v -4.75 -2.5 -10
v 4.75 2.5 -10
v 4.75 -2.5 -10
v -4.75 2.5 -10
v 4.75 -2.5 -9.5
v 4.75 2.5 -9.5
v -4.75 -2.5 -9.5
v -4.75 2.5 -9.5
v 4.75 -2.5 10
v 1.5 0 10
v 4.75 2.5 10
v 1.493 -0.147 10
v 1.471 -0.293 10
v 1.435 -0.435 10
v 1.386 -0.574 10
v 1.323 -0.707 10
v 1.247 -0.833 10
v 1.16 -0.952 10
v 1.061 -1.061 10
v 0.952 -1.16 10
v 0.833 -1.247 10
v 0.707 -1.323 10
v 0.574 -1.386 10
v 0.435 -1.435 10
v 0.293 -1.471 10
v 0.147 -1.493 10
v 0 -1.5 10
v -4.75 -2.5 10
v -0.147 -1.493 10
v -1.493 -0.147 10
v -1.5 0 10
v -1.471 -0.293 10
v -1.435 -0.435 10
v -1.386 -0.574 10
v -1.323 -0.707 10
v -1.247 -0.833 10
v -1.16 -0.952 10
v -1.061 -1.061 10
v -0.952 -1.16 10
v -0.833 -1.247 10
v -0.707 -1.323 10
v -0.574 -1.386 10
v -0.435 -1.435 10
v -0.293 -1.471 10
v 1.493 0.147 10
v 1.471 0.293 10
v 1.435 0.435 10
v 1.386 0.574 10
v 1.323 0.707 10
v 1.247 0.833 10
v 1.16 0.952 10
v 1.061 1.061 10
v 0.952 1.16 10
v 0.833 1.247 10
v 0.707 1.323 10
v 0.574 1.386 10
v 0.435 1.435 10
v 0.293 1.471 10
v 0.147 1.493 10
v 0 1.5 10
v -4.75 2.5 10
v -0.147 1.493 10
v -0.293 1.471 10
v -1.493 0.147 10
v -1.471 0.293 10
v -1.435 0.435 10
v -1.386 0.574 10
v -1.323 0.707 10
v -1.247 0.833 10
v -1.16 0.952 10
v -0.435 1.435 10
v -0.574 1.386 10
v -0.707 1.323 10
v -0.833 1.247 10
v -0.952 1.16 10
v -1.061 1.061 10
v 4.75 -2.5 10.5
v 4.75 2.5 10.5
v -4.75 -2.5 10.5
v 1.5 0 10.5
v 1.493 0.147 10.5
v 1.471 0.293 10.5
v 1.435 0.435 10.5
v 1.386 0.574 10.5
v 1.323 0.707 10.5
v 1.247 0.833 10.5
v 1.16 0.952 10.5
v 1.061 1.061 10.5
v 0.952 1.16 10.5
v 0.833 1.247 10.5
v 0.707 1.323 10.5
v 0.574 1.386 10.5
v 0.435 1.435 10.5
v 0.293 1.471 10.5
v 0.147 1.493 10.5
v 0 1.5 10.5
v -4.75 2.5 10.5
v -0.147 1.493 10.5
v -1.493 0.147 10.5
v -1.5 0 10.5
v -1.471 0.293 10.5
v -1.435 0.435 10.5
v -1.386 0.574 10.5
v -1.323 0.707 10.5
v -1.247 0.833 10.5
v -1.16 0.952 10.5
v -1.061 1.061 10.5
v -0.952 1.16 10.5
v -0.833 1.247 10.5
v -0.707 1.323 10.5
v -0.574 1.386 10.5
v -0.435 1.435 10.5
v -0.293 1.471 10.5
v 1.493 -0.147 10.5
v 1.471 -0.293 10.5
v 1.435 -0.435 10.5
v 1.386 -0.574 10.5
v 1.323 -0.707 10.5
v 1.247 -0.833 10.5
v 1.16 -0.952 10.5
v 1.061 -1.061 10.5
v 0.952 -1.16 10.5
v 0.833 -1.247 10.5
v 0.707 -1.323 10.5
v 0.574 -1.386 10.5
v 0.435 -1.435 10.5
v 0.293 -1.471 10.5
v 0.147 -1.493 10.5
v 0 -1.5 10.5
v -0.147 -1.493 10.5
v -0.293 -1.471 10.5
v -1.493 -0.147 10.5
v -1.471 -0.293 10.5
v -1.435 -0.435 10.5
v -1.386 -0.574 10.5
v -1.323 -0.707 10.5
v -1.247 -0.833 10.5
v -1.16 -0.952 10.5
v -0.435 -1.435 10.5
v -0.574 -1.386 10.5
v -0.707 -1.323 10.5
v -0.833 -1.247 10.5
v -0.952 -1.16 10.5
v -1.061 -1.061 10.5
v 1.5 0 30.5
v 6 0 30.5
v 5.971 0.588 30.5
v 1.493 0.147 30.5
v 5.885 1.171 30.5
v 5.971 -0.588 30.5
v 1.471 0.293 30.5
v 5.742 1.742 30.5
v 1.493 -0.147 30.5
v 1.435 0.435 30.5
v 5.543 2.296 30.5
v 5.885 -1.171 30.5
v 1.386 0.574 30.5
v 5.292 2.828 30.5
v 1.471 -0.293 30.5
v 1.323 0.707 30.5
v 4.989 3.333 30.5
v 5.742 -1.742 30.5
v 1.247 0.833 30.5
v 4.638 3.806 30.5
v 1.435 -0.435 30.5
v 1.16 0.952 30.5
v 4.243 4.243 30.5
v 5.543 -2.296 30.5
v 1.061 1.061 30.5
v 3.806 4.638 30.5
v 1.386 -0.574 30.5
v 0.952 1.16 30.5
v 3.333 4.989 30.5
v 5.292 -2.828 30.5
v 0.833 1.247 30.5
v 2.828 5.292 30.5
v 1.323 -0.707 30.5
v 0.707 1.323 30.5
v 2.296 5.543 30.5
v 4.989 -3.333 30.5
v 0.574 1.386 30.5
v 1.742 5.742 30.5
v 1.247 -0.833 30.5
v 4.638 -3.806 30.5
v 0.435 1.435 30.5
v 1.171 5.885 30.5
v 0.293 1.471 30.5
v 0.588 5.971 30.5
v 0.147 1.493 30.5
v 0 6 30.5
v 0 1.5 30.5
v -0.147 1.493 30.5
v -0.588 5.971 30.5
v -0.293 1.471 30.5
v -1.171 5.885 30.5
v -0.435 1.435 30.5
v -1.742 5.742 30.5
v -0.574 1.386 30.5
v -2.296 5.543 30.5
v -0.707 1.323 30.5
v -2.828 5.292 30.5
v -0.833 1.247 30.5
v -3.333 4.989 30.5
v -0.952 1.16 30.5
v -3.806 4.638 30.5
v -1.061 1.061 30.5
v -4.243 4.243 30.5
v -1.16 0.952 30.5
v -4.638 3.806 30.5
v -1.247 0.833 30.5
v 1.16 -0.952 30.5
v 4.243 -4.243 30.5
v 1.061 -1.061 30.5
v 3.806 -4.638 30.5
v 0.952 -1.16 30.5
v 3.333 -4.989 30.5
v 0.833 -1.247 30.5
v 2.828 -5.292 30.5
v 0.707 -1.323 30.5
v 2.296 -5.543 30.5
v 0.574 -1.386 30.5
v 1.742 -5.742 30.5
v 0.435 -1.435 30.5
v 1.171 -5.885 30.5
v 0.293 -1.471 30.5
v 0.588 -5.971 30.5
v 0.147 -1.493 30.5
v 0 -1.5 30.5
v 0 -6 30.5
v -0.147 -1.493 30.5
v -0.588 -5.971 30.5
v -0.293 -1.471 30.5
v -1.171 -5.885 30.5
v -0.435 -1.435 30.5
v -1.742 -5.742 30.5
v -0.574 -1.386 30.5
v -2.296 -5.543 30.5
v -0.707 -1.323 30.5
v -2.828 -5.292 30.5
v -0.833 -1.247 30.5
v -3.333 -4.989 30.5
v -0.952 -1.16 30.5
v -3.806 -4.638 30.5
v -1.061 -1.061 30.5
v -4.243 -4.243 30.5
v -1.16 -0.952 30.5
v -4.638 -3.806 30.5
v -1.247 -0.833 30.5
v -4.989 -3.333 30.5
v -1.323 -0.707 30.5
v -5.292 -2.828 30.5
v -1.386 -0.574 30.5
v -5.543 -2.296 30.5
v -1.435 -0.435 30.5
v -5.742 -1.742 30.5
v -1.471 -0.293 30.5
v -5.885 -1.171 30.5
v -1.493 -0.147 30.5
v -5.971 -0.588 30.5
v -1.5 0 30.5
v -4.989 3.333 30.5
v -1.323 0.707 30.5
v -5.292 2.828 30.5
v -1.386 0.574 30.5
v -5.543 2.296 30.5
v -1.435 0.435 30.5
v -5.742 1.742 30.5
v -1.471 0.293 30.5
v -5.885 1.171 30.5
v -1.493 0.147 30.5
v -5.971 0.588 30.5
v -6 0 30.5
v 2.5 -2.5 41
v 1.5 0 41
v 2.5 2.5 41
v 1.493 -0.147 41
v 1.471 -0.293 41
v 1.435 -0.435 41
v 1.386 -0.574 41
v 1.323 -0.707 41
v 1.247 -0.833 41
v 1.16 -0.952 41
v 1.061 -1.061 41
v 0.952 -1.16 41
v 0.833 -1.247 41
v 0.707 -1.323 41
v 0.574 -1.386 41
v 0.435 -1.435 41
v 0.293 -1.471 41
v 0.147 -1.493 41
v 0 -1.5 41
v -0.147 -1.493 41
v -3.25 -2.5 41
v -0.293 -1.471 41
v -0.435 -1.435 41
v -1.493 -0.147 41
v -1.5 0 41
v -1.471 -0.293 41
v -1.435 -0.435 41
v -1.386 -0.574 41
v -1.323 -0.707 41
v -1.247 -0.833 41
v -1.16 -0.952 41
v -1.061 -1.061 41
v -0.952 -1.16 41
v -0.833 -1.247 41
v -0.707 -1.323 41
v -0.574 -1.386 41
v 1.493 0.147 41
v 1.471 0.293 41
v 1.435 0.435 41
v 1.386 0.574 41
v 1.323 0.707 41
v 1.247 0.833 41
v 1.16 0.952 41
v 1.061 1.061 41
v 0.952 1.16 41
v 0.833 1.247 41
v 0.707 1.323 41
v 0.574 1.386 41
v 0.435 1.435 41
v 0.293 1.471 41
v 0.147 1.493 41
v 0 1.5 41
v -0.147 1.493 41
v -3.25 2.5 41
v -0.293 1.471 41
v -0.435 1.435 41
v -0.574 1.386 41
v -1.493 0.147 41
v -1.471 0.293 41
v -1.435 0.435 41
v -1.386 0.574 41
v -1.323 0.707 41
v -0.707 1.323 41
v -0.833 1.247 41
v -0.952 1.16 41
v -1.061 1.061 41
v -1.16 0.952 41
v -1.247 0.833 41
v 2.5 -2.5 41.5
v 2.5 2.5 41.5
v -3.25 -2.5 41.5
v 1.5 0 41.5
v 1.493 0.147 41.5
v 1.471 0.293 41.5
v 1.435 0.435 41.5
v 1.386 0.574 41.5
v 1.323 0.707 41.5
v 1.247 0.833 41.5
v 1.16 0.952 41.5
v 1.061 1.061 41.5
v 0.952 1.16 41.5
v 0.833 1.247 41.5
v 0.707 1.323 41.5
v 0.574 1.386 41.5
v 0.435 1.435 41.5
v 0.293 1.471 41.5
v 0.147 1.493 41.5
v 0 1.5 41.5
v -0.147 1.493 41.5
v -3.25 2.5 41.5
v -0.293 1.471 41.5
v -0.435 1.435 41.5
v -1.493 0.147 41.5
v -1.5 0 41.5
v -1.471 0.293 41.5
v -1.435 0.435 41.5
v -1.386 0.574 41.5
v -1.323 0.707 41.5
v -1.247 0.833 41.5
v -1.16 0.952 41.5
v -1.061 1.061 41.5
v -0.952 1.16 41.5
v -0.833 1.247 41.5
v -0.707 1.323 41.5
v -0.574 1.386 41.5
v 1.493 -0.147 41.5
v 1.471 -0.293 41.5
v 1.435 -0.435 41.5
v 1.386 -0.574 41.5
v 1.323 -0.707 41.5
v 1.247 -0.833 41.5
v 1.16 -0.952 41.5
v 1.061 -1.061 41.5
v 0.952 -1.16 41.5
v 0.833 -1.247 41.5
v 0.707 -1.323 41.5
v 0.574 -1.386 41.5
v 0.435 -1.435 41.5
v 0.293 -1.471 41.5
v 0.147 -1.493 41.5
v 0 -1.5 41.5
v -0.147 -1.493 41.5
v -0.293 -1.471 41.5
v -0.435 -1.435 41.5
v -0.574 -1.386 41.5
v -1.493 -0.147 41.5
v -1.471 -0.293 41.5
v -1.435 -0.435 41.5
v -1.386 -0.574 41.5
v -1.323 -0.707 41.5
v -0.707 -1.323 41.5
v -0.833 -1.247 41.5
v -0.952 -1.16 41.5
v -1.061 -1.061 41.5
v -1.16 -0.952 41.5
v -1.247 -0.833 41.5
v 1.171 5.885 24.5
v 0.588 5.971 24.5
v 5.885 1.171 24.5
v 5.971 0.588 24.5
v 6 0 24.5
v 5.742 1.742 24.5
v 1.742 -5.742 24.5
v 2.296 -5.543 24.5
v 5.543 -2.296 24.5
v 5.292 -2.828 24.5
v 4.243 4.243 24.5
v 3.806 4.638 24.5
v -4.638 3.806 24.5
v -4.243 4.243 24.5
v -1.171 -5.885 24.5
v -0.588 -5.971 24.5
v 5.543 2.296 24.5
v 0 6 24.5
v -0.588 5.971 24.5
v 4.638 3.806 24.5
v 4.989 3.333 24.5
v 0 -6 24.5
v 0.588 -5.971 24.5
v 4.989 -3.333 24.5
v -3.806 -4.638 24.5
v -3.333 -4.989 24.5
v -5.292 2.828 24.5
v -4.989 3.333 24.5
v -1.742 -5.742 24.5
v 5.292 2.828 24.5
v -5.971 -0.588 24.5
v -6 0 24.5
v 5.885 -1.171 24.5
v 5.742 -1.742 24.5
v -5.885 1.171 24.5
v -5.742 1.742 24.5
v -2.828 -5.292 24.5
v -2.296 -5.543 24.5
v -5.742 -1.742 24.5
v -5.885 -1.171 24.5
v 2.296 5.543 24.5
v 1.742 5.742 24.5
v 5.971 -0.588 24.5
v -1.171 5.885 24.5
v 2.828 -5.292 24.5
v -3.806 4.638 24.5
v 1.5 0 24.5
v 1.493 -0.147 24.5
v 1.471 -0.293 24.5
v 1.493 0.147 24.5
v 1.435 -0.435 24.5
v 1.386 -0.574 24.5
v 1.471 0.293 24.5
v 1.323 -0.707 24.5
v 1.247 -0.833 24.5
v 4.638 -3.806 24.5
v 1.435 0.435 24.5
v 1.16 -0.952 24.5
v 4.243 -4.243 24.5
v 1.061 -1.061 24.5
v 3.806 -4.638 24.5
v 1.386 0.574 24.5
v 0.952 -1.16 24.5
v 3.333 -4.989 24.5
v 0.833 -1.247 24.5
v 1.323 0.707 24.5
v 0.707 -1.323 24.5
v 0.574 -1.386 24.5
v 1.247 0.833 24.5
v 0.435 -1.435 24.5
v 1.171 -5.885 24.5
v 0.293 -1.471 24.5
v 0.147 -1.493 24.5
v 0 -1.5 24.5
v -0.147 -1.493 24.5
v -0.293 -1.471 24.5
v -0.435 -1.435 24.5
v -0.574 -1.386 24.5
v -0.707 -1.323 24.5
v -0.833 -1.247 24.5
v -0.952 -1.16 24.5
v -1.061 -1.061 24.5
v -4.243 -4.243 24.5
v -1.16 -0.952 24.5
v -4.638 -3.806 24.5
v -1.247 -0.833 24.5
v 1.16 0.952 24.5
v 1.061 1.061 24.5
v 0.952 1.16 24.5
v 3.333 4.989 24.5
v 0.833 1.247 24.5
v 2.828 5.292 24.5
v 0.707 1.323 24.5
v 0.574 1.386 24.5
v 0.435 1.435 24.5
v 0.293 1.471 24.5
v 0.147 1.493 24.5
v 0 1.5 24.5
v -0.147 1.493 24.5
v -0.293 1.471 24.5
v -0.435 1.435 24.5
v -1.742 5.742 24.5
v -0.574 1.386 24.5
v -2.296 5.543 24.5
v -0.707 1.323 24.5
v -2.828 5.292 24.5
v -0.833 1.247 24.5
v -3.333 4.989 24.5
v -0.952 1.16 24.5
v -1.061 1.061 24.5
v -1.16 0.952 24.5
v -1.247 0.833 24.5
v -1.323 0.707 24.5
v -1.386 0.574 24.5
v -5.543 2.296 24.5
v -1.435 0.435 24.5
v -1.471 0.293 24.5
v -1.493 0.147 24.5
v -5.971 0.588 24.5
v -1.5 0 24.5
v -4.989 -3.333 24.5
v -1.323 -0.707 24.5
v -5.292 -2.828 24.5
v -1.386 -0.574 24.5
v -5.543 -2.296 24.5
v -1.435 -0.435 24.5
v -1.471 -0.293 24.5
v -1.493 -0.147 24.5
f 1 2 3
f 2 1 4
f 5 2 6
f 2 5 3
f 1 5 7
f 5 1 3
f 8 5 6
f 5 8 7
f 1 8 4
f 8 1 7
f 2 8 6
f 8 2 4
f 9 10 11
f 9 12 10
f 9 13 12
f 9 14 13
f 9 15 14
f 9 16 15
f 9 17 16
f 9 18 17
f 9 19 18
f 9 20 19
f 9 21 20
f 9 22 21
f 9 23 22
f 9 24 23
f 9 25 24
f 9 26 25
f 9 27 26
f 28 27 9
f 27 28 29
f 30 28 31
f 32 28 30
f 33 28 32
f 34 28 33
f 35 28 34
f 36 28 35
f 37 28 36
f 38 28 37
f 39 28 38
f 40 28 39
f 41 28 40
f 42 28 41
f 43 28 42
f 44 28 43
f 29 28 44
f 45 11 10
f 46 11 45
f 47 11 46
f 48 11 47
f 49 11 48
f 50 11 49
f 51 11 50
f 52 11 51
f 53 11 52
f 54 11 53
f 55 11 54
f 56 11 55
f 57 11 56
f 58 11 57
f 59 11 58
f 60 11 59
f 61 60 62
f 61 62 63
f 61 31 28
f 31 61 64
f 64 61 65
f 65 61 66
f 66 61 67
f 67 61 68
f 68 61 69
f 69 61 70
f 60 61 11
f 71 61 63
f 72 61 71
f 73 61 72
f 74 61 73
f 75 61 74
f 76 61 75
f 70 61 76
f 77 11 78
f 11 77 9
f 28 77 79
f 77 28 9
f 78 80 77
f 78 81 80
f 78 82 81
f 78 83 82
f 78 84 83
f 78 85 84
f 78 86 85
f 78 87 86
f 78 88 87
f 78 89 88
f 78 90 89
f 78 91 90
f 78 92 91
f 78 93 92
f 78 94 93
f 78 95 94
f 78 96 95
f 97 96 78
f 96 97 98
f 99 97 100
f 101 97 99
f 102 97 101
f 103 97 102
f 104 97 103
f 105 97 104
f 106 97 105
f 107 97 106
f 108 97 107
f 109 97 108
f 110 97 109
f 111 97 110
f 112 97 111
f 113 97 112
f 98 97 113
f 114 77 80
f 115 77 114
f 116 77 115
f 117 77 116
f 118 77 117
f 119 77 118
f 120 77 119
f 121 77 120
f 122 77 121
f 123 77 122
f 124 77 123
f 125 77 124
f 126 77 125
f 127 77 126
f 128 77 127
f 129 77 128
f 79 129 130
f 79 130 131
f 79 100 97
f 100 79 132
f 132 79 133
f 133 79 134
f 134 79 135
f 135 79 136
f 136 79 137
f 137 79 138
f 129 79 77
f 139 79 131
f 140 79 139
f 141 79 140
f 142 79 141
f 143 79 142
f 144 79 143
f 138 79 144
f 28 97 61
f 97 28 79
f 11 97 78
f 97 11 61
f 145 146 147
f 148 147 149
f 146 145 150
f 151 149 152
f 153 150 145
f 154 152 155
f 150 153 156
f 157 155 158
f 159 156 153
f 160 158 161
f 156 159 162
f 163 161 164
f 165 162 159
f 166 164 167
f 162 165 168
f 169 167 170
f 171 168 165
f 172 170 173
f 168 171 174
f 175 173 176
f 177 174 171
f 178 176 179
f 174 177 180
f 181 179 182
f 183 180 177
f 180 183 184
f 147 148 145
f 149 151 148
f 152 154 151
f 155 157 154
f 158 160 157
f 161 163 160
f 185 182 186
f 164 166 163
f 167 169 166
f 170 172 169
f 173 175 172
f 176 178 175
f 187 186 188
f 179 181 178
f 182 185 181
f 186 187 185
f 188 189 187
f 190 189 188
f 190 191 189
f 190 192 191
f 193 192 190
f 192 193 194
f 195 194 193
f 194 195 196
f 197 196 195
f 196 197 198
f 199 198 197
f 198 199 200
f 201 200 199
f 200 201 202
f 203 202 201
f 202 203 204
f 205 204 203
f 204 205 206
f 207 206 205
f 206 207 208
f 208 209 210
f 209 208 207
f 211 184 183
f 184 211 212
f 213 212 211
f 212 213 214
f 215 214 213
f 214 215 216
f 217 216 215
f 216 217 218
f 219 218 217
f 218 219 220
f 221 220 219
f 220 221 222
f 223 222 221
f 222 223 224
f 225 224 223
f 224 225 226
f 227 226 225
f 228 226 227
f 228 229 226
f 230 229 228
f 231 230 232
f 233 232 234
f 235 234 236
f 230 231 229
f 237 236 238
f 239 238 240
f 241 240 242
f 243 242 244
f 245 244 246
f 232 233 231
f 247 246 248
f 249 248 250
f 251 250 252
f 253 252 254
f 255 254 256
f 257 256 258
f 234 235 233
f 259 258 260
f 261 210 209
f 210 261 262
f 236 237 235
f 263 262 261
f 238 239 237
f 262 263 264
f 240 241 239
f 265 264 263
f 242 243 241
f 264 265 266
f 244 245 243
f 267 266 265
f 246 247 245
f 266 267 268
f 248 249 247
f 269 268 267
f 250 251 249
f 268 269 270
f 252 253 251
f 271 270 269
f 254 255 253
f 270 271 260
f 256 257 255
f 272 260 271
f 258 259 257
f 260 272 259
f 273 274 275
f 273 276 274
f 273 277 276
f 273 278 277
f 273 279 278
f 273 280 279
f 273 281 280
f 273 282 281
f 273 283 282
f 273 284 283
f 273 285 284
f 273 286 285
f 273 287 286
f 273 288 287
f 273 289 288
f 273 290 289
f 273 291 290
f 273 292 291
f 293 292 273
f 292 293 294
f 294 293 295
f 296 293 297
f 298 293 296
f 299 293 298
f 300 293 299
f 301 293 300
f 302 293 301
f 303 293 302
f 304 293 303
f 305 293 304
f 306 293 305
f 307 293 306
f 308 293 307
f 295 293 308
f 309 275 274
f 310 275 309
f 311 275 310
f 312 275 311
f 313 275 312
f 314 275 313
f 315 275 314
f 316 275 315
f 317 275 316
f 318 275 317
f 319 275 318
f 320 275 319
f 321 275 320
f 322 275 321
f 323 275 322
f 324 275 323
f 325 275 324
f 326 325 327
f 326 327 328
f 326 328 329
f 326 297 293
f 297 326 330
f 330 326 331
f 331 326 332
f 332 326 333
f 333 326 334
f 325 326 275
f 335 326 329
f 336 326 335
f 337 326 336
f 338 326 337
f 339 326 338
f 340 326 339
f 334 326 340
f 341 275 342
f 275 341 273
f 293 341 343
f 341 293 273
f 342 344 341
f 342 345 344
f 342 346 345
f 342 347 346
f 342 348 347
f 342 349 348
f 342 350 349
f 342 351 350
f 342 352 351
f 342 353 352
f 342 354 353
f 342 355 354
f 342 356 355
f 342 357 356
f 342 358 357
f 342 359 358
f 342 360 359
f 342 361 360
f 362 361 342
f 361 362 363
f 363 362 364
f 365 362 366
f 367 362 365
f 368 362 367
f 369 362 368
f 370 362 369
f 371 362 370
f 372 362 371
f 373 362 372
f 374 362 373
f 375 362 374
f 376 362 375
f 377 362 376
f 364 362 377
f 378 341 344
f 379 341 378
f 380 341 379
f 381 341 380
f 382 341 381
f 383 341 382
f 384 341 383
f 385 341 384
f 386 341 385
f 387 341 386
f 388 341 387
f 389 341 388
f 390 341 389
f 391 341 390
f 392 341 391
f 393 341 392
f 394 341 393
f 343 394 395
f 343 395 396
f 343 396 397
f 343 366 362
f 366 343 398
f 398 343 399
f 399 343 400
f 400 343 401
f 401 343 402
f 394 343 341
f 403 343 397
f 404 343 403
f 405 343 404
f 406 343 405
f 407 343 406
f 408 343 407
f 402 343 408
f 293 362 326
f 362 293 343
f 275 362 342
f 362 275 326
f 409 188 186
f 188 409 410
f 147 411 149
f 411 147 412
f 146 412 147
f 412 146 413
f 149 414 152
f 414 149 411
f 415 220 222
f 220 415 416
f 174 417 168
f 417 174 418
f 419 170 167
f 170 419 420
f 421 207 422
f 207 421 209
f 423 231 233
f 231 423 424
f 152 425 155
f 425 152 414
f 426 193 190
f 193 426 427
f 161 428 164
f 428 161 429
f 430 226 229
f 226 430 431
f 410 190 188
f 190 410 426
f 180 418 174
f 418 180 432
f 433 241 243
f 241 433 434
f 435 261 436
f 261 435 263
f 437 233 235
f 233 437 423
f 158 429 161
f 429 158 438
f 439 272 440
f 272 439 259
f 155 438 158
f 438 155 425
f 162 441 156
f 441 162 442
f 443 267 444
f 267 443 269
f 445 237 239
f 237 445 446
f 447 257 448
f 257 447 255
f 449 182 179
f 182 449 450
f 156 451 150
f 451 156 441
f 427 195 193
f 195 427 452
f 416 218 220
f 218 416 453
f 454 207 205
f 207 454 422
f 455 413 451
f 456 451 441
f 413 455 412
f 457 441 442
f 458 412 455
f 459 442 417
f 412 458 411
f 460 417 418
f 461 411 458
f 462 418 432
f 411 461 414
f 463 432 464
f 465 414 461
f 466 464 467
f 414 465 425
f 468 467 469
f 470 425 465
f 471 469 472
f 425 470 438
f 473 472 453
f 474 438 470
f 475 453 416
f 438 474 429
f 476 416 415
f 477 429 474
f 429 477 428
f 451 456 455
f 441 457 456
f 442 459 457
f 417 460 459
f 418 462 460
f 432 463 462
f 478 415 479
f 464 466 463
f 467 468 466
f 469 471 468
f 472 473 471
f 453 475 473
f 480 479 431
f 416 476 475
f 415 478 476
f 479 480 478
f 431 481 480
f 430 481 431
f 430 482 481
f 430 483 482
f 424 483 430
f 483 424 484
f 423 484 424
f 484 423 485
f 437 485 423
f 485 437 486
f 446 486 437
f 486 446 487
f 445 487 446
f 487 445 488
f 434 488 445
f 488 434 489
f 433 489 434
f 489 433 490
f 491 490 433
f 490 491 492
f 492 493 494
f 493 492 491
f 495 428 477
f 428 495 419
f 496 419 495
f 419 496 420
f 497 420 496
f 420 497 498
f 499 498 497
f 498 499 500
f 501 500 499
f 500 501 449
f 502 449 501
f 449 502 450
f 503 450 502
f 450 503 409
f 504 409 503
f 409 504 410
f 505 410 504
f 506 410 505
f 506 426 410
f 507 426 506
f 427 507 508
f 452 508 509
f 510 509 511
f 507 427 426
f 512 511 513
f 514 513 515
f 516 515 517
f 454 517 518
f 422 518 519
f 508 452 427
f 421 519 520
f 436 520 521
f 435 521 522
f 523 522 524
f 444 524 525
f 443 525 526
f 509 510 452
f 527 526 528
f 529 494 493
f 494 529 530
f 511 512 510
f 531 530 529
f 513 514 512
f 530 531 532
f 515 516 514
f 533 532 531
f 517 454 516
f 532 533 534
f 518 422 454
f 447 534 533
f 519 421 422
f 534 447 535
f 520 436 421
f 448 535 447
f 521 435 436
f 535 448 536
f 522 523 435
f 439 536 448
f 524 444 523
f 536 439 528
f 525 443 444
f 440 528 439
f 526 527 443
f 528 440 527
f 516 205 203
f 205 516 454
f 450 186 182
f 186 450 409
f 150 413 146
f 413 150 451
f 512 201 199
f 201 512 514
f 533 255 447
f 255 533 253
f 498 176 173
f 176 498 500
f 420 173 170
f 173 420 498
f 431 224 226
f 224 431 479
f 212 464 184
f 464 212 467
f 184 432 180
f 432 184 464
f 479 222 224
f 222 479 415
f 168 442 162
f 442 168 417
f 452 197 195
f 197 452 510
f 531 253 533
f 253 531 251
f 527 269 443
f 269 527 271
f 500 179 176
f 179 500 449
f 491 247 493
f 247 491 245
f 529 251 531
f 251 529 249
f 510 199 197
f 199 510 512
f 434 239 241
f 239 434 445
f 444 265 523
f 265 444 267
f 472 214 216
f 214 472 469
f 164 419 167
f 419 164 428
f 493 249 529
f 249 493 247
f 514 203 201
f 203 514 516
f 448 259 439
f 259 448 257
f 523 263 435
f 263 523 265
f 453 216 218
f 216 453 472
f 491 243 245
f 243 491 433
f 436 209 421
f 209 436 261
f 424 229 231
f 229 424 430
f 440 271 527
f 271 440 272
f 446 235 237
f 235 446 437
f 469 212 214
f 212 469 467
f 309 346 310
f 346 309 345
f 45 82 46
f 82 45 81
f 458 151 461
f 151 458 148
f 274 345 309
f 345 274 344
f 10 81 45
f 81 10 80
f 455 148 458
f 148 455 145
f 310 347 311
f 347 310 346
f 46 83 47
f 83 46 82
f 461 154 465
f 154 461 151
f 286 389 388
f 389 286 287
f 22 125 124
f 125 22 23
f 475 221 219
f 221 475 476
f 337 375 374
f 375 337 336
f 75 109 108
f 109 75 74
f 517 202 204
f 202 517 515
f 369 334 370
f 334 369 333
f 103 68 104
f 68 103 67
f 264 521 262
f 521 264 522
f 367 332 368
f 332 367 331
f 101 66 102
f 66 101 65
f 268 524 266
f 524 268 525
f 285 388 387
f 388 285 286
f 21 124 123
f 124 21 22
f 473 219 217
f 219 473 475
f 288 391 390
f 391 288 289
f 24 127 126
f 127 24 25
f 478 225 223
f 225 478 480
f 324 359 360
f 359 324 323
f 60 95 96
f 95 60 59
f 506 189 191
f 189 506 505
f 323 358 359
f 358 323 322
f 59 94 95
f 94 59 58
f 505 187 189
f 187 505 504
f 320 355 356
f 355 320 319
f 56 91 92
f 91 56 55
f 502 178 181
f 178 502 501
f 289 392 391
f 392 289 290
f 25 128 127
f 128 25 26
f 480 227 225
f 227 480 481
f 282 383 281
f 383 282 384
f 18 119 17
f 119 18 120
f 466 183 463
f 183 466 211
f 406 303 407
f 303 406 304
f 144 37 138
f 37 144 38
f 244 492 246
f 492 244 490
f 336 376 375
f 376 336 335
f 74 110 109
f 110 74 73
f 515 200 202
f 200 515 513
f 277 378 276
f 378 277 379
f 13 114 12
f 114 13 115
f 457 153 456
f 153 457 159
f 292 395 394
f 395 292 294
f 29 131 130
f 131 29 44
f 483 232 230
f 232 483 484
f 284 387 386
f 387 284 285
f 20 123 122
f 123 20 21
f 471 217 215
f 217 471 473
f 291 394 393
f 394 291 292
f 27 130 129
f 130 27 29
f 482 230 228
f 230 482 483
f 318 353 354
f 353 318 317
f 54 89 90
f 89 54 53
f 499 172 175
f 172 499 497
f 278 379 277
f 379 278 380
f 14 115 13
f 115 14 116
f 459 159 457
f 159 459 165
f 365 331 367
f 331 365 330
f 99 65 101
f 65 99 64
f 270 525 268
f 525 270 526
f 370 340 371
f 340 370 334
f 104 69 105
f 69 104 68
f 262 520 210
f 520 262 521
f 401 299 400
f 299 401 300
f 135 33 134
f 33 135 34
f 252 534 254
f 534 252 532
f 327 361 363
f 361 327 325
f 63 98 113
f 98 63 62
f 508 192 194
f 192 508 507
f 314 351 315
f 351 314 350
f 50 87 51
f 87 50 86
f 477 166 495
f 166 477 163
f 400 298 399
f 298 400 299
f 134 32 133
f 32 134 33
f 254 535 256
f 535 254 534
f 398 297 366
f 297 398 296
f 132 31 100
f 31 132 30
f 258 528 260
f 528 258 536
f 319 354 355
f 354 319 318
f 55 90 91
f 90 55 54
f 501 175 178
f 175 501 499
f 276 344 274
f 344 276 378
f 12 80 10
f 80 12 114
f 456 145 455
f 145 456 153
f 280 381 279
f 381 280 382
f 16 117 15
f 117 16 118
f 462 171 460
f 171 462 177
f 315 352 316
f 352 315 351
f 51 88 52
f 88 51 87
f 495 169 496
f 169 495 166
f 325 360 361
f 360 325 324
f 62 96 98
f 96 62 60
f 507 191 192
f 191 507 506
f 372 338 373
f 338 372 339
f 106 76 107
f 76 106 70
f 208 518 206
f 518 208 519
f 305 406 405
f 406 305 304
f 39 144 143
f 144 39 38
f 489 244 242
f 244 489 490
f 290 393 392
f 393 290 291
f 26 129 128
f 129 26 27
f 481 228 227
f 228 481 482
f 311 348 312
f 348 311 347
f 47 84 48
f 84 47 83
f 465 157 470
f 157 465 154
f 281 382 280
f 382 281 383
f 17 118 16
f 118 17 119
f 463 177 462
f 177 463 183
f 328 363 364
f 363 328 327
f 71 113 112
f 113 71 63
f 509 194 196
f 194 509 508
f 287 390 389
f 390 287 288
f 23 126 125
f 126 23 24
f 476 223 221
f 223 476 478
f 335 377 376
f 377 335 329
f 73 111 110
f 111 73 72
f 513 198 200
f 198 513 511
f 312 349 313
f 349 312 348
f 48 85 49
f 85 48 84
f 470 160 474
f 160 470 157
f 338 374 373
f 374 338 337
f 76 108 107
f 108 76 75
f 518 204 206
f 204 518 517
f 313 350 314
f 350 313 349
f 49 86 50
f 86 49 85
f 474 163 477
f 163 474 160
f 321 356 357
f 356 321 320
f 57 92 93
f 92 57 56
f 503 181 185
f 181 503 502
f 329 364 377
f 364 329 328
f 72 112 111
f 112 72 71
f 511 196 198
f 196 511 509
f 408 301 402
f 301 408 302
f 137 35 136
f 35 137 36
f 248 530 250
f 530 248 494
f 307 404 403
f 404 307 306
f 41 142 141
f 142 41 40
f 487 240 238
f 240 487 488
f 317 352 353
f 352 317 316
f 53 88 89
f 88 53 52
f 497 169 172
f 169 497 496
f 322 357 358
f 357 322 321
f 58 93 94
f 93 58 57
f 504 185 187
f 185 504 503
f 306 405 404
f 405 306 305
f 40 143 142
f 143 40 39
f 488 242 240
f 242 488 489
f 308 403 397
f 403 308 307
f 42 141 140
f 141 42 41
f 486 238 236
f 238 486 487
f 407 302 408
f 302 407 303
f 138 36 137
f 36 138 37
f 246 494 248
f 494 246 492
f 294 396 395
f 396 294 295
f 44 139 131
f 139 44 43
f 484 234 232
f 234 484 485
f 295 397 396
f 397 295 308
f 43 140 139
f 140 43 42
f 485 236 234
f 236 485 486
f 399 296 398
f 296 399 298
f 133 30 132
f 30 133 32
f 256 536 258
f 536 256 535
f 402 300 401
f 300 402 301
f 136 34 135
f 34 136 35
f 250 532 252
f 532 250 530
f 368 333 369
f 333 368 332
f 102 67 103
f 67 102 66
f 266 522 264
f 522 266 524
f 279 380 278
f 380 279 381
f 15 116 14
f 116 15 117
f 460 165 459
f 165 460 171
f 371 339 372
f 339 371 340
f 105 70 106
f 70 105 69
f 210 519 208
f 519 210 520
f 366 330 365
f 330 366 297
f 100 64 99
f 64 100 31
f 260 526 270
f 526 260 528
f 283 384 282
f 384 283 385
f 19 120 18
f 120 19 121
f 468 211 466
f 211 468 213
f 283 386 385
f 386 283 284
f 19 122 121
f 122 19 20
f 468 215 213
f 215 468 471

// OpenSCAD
// Straight hose-barb reducer: 8 mm tubing (barbs) -> 5 mm tubing (barbs)
// Print orientation: standing upright along Z, centred on origin in X/Y

$fn = 64;

// ---- Dimensions (mm) ----
small_id      = 8;    // inner diameter of the larger (8 mm) tubing
large_id      = 5;    // inner diameter of the smaller (5 mm) tubing
bore          = 3;    // through-bore diameter
barb_h_8      = 10;   // height of each 8 mm barb
collar_h      = 5;    // height of the 12 mm collar (z = 20 to 25)
barb_h_5      = 8;    // height of each 5 mm barb
eps           = 0.5;  // overshoot for clean boolean cuts

// ---- Derived ----
x = bore / 2 + 1;  // radial offset of the through-bore from the axis
z0 = 0;
z1 = z0 + 2 * barb_h_8;   // top of the 8 mm barbs (20)
z2 = z1 + collar_h;       // top of the collar (25)
z3 = z2 + 2 * barb_h_5;   // top of the 5 mm barbs (41)

// ---- Model ----
difference() {
    union() {
        // 8 mm tubing barbs: sawtooth profile, stacked
        for (s = [-1, 1])
            translate([0, 0, z0 + s * barb_h_8])
                linear_extrude(height = eps)
                    polygon([
                        [-9.5 / 2, -x], [-9.5 / 2, x], [9.5 / 2, x], [9.5 / 2, -x]
                    ]);

        // 8 mm tubing barbs: sawtooth profile, stacked
        for (s = [-1, 1])
            translate([0, 0, z1 + s * barb_h_8])
                linear_extrude(height = eps)
                    polygon([
                        [-7.5 / 2, -x], [-7.5 / 2, x], [7.5 / 2, x], [7.5 / 2, -x]
                    ]);

        // Cylindrical collar (z = 20 to 25)
        translate([0, 0, z2 - eps])
            cylinder(h = collar_h + 2 * eps, d = 12);

        // 5 mm tubing barbs: shrinking profile, stacked
        for (s = [-1, 1])
            translate([0, 0, z3 - barb_h_5 + s * barb_h_5])
                linear_extrude(height = eps)
                    polygon([
                        [-6.5 / 2, -x], [-6.5 / 2, x], [5 / 2, x], [5 / 2, -x]
                    ]);
    }

    // Full-length 3 mm bore
    translate([0, 0, z0 - eps])
        cylinder(h = z3 - z0 + 2 * eps, d = bore);
}
